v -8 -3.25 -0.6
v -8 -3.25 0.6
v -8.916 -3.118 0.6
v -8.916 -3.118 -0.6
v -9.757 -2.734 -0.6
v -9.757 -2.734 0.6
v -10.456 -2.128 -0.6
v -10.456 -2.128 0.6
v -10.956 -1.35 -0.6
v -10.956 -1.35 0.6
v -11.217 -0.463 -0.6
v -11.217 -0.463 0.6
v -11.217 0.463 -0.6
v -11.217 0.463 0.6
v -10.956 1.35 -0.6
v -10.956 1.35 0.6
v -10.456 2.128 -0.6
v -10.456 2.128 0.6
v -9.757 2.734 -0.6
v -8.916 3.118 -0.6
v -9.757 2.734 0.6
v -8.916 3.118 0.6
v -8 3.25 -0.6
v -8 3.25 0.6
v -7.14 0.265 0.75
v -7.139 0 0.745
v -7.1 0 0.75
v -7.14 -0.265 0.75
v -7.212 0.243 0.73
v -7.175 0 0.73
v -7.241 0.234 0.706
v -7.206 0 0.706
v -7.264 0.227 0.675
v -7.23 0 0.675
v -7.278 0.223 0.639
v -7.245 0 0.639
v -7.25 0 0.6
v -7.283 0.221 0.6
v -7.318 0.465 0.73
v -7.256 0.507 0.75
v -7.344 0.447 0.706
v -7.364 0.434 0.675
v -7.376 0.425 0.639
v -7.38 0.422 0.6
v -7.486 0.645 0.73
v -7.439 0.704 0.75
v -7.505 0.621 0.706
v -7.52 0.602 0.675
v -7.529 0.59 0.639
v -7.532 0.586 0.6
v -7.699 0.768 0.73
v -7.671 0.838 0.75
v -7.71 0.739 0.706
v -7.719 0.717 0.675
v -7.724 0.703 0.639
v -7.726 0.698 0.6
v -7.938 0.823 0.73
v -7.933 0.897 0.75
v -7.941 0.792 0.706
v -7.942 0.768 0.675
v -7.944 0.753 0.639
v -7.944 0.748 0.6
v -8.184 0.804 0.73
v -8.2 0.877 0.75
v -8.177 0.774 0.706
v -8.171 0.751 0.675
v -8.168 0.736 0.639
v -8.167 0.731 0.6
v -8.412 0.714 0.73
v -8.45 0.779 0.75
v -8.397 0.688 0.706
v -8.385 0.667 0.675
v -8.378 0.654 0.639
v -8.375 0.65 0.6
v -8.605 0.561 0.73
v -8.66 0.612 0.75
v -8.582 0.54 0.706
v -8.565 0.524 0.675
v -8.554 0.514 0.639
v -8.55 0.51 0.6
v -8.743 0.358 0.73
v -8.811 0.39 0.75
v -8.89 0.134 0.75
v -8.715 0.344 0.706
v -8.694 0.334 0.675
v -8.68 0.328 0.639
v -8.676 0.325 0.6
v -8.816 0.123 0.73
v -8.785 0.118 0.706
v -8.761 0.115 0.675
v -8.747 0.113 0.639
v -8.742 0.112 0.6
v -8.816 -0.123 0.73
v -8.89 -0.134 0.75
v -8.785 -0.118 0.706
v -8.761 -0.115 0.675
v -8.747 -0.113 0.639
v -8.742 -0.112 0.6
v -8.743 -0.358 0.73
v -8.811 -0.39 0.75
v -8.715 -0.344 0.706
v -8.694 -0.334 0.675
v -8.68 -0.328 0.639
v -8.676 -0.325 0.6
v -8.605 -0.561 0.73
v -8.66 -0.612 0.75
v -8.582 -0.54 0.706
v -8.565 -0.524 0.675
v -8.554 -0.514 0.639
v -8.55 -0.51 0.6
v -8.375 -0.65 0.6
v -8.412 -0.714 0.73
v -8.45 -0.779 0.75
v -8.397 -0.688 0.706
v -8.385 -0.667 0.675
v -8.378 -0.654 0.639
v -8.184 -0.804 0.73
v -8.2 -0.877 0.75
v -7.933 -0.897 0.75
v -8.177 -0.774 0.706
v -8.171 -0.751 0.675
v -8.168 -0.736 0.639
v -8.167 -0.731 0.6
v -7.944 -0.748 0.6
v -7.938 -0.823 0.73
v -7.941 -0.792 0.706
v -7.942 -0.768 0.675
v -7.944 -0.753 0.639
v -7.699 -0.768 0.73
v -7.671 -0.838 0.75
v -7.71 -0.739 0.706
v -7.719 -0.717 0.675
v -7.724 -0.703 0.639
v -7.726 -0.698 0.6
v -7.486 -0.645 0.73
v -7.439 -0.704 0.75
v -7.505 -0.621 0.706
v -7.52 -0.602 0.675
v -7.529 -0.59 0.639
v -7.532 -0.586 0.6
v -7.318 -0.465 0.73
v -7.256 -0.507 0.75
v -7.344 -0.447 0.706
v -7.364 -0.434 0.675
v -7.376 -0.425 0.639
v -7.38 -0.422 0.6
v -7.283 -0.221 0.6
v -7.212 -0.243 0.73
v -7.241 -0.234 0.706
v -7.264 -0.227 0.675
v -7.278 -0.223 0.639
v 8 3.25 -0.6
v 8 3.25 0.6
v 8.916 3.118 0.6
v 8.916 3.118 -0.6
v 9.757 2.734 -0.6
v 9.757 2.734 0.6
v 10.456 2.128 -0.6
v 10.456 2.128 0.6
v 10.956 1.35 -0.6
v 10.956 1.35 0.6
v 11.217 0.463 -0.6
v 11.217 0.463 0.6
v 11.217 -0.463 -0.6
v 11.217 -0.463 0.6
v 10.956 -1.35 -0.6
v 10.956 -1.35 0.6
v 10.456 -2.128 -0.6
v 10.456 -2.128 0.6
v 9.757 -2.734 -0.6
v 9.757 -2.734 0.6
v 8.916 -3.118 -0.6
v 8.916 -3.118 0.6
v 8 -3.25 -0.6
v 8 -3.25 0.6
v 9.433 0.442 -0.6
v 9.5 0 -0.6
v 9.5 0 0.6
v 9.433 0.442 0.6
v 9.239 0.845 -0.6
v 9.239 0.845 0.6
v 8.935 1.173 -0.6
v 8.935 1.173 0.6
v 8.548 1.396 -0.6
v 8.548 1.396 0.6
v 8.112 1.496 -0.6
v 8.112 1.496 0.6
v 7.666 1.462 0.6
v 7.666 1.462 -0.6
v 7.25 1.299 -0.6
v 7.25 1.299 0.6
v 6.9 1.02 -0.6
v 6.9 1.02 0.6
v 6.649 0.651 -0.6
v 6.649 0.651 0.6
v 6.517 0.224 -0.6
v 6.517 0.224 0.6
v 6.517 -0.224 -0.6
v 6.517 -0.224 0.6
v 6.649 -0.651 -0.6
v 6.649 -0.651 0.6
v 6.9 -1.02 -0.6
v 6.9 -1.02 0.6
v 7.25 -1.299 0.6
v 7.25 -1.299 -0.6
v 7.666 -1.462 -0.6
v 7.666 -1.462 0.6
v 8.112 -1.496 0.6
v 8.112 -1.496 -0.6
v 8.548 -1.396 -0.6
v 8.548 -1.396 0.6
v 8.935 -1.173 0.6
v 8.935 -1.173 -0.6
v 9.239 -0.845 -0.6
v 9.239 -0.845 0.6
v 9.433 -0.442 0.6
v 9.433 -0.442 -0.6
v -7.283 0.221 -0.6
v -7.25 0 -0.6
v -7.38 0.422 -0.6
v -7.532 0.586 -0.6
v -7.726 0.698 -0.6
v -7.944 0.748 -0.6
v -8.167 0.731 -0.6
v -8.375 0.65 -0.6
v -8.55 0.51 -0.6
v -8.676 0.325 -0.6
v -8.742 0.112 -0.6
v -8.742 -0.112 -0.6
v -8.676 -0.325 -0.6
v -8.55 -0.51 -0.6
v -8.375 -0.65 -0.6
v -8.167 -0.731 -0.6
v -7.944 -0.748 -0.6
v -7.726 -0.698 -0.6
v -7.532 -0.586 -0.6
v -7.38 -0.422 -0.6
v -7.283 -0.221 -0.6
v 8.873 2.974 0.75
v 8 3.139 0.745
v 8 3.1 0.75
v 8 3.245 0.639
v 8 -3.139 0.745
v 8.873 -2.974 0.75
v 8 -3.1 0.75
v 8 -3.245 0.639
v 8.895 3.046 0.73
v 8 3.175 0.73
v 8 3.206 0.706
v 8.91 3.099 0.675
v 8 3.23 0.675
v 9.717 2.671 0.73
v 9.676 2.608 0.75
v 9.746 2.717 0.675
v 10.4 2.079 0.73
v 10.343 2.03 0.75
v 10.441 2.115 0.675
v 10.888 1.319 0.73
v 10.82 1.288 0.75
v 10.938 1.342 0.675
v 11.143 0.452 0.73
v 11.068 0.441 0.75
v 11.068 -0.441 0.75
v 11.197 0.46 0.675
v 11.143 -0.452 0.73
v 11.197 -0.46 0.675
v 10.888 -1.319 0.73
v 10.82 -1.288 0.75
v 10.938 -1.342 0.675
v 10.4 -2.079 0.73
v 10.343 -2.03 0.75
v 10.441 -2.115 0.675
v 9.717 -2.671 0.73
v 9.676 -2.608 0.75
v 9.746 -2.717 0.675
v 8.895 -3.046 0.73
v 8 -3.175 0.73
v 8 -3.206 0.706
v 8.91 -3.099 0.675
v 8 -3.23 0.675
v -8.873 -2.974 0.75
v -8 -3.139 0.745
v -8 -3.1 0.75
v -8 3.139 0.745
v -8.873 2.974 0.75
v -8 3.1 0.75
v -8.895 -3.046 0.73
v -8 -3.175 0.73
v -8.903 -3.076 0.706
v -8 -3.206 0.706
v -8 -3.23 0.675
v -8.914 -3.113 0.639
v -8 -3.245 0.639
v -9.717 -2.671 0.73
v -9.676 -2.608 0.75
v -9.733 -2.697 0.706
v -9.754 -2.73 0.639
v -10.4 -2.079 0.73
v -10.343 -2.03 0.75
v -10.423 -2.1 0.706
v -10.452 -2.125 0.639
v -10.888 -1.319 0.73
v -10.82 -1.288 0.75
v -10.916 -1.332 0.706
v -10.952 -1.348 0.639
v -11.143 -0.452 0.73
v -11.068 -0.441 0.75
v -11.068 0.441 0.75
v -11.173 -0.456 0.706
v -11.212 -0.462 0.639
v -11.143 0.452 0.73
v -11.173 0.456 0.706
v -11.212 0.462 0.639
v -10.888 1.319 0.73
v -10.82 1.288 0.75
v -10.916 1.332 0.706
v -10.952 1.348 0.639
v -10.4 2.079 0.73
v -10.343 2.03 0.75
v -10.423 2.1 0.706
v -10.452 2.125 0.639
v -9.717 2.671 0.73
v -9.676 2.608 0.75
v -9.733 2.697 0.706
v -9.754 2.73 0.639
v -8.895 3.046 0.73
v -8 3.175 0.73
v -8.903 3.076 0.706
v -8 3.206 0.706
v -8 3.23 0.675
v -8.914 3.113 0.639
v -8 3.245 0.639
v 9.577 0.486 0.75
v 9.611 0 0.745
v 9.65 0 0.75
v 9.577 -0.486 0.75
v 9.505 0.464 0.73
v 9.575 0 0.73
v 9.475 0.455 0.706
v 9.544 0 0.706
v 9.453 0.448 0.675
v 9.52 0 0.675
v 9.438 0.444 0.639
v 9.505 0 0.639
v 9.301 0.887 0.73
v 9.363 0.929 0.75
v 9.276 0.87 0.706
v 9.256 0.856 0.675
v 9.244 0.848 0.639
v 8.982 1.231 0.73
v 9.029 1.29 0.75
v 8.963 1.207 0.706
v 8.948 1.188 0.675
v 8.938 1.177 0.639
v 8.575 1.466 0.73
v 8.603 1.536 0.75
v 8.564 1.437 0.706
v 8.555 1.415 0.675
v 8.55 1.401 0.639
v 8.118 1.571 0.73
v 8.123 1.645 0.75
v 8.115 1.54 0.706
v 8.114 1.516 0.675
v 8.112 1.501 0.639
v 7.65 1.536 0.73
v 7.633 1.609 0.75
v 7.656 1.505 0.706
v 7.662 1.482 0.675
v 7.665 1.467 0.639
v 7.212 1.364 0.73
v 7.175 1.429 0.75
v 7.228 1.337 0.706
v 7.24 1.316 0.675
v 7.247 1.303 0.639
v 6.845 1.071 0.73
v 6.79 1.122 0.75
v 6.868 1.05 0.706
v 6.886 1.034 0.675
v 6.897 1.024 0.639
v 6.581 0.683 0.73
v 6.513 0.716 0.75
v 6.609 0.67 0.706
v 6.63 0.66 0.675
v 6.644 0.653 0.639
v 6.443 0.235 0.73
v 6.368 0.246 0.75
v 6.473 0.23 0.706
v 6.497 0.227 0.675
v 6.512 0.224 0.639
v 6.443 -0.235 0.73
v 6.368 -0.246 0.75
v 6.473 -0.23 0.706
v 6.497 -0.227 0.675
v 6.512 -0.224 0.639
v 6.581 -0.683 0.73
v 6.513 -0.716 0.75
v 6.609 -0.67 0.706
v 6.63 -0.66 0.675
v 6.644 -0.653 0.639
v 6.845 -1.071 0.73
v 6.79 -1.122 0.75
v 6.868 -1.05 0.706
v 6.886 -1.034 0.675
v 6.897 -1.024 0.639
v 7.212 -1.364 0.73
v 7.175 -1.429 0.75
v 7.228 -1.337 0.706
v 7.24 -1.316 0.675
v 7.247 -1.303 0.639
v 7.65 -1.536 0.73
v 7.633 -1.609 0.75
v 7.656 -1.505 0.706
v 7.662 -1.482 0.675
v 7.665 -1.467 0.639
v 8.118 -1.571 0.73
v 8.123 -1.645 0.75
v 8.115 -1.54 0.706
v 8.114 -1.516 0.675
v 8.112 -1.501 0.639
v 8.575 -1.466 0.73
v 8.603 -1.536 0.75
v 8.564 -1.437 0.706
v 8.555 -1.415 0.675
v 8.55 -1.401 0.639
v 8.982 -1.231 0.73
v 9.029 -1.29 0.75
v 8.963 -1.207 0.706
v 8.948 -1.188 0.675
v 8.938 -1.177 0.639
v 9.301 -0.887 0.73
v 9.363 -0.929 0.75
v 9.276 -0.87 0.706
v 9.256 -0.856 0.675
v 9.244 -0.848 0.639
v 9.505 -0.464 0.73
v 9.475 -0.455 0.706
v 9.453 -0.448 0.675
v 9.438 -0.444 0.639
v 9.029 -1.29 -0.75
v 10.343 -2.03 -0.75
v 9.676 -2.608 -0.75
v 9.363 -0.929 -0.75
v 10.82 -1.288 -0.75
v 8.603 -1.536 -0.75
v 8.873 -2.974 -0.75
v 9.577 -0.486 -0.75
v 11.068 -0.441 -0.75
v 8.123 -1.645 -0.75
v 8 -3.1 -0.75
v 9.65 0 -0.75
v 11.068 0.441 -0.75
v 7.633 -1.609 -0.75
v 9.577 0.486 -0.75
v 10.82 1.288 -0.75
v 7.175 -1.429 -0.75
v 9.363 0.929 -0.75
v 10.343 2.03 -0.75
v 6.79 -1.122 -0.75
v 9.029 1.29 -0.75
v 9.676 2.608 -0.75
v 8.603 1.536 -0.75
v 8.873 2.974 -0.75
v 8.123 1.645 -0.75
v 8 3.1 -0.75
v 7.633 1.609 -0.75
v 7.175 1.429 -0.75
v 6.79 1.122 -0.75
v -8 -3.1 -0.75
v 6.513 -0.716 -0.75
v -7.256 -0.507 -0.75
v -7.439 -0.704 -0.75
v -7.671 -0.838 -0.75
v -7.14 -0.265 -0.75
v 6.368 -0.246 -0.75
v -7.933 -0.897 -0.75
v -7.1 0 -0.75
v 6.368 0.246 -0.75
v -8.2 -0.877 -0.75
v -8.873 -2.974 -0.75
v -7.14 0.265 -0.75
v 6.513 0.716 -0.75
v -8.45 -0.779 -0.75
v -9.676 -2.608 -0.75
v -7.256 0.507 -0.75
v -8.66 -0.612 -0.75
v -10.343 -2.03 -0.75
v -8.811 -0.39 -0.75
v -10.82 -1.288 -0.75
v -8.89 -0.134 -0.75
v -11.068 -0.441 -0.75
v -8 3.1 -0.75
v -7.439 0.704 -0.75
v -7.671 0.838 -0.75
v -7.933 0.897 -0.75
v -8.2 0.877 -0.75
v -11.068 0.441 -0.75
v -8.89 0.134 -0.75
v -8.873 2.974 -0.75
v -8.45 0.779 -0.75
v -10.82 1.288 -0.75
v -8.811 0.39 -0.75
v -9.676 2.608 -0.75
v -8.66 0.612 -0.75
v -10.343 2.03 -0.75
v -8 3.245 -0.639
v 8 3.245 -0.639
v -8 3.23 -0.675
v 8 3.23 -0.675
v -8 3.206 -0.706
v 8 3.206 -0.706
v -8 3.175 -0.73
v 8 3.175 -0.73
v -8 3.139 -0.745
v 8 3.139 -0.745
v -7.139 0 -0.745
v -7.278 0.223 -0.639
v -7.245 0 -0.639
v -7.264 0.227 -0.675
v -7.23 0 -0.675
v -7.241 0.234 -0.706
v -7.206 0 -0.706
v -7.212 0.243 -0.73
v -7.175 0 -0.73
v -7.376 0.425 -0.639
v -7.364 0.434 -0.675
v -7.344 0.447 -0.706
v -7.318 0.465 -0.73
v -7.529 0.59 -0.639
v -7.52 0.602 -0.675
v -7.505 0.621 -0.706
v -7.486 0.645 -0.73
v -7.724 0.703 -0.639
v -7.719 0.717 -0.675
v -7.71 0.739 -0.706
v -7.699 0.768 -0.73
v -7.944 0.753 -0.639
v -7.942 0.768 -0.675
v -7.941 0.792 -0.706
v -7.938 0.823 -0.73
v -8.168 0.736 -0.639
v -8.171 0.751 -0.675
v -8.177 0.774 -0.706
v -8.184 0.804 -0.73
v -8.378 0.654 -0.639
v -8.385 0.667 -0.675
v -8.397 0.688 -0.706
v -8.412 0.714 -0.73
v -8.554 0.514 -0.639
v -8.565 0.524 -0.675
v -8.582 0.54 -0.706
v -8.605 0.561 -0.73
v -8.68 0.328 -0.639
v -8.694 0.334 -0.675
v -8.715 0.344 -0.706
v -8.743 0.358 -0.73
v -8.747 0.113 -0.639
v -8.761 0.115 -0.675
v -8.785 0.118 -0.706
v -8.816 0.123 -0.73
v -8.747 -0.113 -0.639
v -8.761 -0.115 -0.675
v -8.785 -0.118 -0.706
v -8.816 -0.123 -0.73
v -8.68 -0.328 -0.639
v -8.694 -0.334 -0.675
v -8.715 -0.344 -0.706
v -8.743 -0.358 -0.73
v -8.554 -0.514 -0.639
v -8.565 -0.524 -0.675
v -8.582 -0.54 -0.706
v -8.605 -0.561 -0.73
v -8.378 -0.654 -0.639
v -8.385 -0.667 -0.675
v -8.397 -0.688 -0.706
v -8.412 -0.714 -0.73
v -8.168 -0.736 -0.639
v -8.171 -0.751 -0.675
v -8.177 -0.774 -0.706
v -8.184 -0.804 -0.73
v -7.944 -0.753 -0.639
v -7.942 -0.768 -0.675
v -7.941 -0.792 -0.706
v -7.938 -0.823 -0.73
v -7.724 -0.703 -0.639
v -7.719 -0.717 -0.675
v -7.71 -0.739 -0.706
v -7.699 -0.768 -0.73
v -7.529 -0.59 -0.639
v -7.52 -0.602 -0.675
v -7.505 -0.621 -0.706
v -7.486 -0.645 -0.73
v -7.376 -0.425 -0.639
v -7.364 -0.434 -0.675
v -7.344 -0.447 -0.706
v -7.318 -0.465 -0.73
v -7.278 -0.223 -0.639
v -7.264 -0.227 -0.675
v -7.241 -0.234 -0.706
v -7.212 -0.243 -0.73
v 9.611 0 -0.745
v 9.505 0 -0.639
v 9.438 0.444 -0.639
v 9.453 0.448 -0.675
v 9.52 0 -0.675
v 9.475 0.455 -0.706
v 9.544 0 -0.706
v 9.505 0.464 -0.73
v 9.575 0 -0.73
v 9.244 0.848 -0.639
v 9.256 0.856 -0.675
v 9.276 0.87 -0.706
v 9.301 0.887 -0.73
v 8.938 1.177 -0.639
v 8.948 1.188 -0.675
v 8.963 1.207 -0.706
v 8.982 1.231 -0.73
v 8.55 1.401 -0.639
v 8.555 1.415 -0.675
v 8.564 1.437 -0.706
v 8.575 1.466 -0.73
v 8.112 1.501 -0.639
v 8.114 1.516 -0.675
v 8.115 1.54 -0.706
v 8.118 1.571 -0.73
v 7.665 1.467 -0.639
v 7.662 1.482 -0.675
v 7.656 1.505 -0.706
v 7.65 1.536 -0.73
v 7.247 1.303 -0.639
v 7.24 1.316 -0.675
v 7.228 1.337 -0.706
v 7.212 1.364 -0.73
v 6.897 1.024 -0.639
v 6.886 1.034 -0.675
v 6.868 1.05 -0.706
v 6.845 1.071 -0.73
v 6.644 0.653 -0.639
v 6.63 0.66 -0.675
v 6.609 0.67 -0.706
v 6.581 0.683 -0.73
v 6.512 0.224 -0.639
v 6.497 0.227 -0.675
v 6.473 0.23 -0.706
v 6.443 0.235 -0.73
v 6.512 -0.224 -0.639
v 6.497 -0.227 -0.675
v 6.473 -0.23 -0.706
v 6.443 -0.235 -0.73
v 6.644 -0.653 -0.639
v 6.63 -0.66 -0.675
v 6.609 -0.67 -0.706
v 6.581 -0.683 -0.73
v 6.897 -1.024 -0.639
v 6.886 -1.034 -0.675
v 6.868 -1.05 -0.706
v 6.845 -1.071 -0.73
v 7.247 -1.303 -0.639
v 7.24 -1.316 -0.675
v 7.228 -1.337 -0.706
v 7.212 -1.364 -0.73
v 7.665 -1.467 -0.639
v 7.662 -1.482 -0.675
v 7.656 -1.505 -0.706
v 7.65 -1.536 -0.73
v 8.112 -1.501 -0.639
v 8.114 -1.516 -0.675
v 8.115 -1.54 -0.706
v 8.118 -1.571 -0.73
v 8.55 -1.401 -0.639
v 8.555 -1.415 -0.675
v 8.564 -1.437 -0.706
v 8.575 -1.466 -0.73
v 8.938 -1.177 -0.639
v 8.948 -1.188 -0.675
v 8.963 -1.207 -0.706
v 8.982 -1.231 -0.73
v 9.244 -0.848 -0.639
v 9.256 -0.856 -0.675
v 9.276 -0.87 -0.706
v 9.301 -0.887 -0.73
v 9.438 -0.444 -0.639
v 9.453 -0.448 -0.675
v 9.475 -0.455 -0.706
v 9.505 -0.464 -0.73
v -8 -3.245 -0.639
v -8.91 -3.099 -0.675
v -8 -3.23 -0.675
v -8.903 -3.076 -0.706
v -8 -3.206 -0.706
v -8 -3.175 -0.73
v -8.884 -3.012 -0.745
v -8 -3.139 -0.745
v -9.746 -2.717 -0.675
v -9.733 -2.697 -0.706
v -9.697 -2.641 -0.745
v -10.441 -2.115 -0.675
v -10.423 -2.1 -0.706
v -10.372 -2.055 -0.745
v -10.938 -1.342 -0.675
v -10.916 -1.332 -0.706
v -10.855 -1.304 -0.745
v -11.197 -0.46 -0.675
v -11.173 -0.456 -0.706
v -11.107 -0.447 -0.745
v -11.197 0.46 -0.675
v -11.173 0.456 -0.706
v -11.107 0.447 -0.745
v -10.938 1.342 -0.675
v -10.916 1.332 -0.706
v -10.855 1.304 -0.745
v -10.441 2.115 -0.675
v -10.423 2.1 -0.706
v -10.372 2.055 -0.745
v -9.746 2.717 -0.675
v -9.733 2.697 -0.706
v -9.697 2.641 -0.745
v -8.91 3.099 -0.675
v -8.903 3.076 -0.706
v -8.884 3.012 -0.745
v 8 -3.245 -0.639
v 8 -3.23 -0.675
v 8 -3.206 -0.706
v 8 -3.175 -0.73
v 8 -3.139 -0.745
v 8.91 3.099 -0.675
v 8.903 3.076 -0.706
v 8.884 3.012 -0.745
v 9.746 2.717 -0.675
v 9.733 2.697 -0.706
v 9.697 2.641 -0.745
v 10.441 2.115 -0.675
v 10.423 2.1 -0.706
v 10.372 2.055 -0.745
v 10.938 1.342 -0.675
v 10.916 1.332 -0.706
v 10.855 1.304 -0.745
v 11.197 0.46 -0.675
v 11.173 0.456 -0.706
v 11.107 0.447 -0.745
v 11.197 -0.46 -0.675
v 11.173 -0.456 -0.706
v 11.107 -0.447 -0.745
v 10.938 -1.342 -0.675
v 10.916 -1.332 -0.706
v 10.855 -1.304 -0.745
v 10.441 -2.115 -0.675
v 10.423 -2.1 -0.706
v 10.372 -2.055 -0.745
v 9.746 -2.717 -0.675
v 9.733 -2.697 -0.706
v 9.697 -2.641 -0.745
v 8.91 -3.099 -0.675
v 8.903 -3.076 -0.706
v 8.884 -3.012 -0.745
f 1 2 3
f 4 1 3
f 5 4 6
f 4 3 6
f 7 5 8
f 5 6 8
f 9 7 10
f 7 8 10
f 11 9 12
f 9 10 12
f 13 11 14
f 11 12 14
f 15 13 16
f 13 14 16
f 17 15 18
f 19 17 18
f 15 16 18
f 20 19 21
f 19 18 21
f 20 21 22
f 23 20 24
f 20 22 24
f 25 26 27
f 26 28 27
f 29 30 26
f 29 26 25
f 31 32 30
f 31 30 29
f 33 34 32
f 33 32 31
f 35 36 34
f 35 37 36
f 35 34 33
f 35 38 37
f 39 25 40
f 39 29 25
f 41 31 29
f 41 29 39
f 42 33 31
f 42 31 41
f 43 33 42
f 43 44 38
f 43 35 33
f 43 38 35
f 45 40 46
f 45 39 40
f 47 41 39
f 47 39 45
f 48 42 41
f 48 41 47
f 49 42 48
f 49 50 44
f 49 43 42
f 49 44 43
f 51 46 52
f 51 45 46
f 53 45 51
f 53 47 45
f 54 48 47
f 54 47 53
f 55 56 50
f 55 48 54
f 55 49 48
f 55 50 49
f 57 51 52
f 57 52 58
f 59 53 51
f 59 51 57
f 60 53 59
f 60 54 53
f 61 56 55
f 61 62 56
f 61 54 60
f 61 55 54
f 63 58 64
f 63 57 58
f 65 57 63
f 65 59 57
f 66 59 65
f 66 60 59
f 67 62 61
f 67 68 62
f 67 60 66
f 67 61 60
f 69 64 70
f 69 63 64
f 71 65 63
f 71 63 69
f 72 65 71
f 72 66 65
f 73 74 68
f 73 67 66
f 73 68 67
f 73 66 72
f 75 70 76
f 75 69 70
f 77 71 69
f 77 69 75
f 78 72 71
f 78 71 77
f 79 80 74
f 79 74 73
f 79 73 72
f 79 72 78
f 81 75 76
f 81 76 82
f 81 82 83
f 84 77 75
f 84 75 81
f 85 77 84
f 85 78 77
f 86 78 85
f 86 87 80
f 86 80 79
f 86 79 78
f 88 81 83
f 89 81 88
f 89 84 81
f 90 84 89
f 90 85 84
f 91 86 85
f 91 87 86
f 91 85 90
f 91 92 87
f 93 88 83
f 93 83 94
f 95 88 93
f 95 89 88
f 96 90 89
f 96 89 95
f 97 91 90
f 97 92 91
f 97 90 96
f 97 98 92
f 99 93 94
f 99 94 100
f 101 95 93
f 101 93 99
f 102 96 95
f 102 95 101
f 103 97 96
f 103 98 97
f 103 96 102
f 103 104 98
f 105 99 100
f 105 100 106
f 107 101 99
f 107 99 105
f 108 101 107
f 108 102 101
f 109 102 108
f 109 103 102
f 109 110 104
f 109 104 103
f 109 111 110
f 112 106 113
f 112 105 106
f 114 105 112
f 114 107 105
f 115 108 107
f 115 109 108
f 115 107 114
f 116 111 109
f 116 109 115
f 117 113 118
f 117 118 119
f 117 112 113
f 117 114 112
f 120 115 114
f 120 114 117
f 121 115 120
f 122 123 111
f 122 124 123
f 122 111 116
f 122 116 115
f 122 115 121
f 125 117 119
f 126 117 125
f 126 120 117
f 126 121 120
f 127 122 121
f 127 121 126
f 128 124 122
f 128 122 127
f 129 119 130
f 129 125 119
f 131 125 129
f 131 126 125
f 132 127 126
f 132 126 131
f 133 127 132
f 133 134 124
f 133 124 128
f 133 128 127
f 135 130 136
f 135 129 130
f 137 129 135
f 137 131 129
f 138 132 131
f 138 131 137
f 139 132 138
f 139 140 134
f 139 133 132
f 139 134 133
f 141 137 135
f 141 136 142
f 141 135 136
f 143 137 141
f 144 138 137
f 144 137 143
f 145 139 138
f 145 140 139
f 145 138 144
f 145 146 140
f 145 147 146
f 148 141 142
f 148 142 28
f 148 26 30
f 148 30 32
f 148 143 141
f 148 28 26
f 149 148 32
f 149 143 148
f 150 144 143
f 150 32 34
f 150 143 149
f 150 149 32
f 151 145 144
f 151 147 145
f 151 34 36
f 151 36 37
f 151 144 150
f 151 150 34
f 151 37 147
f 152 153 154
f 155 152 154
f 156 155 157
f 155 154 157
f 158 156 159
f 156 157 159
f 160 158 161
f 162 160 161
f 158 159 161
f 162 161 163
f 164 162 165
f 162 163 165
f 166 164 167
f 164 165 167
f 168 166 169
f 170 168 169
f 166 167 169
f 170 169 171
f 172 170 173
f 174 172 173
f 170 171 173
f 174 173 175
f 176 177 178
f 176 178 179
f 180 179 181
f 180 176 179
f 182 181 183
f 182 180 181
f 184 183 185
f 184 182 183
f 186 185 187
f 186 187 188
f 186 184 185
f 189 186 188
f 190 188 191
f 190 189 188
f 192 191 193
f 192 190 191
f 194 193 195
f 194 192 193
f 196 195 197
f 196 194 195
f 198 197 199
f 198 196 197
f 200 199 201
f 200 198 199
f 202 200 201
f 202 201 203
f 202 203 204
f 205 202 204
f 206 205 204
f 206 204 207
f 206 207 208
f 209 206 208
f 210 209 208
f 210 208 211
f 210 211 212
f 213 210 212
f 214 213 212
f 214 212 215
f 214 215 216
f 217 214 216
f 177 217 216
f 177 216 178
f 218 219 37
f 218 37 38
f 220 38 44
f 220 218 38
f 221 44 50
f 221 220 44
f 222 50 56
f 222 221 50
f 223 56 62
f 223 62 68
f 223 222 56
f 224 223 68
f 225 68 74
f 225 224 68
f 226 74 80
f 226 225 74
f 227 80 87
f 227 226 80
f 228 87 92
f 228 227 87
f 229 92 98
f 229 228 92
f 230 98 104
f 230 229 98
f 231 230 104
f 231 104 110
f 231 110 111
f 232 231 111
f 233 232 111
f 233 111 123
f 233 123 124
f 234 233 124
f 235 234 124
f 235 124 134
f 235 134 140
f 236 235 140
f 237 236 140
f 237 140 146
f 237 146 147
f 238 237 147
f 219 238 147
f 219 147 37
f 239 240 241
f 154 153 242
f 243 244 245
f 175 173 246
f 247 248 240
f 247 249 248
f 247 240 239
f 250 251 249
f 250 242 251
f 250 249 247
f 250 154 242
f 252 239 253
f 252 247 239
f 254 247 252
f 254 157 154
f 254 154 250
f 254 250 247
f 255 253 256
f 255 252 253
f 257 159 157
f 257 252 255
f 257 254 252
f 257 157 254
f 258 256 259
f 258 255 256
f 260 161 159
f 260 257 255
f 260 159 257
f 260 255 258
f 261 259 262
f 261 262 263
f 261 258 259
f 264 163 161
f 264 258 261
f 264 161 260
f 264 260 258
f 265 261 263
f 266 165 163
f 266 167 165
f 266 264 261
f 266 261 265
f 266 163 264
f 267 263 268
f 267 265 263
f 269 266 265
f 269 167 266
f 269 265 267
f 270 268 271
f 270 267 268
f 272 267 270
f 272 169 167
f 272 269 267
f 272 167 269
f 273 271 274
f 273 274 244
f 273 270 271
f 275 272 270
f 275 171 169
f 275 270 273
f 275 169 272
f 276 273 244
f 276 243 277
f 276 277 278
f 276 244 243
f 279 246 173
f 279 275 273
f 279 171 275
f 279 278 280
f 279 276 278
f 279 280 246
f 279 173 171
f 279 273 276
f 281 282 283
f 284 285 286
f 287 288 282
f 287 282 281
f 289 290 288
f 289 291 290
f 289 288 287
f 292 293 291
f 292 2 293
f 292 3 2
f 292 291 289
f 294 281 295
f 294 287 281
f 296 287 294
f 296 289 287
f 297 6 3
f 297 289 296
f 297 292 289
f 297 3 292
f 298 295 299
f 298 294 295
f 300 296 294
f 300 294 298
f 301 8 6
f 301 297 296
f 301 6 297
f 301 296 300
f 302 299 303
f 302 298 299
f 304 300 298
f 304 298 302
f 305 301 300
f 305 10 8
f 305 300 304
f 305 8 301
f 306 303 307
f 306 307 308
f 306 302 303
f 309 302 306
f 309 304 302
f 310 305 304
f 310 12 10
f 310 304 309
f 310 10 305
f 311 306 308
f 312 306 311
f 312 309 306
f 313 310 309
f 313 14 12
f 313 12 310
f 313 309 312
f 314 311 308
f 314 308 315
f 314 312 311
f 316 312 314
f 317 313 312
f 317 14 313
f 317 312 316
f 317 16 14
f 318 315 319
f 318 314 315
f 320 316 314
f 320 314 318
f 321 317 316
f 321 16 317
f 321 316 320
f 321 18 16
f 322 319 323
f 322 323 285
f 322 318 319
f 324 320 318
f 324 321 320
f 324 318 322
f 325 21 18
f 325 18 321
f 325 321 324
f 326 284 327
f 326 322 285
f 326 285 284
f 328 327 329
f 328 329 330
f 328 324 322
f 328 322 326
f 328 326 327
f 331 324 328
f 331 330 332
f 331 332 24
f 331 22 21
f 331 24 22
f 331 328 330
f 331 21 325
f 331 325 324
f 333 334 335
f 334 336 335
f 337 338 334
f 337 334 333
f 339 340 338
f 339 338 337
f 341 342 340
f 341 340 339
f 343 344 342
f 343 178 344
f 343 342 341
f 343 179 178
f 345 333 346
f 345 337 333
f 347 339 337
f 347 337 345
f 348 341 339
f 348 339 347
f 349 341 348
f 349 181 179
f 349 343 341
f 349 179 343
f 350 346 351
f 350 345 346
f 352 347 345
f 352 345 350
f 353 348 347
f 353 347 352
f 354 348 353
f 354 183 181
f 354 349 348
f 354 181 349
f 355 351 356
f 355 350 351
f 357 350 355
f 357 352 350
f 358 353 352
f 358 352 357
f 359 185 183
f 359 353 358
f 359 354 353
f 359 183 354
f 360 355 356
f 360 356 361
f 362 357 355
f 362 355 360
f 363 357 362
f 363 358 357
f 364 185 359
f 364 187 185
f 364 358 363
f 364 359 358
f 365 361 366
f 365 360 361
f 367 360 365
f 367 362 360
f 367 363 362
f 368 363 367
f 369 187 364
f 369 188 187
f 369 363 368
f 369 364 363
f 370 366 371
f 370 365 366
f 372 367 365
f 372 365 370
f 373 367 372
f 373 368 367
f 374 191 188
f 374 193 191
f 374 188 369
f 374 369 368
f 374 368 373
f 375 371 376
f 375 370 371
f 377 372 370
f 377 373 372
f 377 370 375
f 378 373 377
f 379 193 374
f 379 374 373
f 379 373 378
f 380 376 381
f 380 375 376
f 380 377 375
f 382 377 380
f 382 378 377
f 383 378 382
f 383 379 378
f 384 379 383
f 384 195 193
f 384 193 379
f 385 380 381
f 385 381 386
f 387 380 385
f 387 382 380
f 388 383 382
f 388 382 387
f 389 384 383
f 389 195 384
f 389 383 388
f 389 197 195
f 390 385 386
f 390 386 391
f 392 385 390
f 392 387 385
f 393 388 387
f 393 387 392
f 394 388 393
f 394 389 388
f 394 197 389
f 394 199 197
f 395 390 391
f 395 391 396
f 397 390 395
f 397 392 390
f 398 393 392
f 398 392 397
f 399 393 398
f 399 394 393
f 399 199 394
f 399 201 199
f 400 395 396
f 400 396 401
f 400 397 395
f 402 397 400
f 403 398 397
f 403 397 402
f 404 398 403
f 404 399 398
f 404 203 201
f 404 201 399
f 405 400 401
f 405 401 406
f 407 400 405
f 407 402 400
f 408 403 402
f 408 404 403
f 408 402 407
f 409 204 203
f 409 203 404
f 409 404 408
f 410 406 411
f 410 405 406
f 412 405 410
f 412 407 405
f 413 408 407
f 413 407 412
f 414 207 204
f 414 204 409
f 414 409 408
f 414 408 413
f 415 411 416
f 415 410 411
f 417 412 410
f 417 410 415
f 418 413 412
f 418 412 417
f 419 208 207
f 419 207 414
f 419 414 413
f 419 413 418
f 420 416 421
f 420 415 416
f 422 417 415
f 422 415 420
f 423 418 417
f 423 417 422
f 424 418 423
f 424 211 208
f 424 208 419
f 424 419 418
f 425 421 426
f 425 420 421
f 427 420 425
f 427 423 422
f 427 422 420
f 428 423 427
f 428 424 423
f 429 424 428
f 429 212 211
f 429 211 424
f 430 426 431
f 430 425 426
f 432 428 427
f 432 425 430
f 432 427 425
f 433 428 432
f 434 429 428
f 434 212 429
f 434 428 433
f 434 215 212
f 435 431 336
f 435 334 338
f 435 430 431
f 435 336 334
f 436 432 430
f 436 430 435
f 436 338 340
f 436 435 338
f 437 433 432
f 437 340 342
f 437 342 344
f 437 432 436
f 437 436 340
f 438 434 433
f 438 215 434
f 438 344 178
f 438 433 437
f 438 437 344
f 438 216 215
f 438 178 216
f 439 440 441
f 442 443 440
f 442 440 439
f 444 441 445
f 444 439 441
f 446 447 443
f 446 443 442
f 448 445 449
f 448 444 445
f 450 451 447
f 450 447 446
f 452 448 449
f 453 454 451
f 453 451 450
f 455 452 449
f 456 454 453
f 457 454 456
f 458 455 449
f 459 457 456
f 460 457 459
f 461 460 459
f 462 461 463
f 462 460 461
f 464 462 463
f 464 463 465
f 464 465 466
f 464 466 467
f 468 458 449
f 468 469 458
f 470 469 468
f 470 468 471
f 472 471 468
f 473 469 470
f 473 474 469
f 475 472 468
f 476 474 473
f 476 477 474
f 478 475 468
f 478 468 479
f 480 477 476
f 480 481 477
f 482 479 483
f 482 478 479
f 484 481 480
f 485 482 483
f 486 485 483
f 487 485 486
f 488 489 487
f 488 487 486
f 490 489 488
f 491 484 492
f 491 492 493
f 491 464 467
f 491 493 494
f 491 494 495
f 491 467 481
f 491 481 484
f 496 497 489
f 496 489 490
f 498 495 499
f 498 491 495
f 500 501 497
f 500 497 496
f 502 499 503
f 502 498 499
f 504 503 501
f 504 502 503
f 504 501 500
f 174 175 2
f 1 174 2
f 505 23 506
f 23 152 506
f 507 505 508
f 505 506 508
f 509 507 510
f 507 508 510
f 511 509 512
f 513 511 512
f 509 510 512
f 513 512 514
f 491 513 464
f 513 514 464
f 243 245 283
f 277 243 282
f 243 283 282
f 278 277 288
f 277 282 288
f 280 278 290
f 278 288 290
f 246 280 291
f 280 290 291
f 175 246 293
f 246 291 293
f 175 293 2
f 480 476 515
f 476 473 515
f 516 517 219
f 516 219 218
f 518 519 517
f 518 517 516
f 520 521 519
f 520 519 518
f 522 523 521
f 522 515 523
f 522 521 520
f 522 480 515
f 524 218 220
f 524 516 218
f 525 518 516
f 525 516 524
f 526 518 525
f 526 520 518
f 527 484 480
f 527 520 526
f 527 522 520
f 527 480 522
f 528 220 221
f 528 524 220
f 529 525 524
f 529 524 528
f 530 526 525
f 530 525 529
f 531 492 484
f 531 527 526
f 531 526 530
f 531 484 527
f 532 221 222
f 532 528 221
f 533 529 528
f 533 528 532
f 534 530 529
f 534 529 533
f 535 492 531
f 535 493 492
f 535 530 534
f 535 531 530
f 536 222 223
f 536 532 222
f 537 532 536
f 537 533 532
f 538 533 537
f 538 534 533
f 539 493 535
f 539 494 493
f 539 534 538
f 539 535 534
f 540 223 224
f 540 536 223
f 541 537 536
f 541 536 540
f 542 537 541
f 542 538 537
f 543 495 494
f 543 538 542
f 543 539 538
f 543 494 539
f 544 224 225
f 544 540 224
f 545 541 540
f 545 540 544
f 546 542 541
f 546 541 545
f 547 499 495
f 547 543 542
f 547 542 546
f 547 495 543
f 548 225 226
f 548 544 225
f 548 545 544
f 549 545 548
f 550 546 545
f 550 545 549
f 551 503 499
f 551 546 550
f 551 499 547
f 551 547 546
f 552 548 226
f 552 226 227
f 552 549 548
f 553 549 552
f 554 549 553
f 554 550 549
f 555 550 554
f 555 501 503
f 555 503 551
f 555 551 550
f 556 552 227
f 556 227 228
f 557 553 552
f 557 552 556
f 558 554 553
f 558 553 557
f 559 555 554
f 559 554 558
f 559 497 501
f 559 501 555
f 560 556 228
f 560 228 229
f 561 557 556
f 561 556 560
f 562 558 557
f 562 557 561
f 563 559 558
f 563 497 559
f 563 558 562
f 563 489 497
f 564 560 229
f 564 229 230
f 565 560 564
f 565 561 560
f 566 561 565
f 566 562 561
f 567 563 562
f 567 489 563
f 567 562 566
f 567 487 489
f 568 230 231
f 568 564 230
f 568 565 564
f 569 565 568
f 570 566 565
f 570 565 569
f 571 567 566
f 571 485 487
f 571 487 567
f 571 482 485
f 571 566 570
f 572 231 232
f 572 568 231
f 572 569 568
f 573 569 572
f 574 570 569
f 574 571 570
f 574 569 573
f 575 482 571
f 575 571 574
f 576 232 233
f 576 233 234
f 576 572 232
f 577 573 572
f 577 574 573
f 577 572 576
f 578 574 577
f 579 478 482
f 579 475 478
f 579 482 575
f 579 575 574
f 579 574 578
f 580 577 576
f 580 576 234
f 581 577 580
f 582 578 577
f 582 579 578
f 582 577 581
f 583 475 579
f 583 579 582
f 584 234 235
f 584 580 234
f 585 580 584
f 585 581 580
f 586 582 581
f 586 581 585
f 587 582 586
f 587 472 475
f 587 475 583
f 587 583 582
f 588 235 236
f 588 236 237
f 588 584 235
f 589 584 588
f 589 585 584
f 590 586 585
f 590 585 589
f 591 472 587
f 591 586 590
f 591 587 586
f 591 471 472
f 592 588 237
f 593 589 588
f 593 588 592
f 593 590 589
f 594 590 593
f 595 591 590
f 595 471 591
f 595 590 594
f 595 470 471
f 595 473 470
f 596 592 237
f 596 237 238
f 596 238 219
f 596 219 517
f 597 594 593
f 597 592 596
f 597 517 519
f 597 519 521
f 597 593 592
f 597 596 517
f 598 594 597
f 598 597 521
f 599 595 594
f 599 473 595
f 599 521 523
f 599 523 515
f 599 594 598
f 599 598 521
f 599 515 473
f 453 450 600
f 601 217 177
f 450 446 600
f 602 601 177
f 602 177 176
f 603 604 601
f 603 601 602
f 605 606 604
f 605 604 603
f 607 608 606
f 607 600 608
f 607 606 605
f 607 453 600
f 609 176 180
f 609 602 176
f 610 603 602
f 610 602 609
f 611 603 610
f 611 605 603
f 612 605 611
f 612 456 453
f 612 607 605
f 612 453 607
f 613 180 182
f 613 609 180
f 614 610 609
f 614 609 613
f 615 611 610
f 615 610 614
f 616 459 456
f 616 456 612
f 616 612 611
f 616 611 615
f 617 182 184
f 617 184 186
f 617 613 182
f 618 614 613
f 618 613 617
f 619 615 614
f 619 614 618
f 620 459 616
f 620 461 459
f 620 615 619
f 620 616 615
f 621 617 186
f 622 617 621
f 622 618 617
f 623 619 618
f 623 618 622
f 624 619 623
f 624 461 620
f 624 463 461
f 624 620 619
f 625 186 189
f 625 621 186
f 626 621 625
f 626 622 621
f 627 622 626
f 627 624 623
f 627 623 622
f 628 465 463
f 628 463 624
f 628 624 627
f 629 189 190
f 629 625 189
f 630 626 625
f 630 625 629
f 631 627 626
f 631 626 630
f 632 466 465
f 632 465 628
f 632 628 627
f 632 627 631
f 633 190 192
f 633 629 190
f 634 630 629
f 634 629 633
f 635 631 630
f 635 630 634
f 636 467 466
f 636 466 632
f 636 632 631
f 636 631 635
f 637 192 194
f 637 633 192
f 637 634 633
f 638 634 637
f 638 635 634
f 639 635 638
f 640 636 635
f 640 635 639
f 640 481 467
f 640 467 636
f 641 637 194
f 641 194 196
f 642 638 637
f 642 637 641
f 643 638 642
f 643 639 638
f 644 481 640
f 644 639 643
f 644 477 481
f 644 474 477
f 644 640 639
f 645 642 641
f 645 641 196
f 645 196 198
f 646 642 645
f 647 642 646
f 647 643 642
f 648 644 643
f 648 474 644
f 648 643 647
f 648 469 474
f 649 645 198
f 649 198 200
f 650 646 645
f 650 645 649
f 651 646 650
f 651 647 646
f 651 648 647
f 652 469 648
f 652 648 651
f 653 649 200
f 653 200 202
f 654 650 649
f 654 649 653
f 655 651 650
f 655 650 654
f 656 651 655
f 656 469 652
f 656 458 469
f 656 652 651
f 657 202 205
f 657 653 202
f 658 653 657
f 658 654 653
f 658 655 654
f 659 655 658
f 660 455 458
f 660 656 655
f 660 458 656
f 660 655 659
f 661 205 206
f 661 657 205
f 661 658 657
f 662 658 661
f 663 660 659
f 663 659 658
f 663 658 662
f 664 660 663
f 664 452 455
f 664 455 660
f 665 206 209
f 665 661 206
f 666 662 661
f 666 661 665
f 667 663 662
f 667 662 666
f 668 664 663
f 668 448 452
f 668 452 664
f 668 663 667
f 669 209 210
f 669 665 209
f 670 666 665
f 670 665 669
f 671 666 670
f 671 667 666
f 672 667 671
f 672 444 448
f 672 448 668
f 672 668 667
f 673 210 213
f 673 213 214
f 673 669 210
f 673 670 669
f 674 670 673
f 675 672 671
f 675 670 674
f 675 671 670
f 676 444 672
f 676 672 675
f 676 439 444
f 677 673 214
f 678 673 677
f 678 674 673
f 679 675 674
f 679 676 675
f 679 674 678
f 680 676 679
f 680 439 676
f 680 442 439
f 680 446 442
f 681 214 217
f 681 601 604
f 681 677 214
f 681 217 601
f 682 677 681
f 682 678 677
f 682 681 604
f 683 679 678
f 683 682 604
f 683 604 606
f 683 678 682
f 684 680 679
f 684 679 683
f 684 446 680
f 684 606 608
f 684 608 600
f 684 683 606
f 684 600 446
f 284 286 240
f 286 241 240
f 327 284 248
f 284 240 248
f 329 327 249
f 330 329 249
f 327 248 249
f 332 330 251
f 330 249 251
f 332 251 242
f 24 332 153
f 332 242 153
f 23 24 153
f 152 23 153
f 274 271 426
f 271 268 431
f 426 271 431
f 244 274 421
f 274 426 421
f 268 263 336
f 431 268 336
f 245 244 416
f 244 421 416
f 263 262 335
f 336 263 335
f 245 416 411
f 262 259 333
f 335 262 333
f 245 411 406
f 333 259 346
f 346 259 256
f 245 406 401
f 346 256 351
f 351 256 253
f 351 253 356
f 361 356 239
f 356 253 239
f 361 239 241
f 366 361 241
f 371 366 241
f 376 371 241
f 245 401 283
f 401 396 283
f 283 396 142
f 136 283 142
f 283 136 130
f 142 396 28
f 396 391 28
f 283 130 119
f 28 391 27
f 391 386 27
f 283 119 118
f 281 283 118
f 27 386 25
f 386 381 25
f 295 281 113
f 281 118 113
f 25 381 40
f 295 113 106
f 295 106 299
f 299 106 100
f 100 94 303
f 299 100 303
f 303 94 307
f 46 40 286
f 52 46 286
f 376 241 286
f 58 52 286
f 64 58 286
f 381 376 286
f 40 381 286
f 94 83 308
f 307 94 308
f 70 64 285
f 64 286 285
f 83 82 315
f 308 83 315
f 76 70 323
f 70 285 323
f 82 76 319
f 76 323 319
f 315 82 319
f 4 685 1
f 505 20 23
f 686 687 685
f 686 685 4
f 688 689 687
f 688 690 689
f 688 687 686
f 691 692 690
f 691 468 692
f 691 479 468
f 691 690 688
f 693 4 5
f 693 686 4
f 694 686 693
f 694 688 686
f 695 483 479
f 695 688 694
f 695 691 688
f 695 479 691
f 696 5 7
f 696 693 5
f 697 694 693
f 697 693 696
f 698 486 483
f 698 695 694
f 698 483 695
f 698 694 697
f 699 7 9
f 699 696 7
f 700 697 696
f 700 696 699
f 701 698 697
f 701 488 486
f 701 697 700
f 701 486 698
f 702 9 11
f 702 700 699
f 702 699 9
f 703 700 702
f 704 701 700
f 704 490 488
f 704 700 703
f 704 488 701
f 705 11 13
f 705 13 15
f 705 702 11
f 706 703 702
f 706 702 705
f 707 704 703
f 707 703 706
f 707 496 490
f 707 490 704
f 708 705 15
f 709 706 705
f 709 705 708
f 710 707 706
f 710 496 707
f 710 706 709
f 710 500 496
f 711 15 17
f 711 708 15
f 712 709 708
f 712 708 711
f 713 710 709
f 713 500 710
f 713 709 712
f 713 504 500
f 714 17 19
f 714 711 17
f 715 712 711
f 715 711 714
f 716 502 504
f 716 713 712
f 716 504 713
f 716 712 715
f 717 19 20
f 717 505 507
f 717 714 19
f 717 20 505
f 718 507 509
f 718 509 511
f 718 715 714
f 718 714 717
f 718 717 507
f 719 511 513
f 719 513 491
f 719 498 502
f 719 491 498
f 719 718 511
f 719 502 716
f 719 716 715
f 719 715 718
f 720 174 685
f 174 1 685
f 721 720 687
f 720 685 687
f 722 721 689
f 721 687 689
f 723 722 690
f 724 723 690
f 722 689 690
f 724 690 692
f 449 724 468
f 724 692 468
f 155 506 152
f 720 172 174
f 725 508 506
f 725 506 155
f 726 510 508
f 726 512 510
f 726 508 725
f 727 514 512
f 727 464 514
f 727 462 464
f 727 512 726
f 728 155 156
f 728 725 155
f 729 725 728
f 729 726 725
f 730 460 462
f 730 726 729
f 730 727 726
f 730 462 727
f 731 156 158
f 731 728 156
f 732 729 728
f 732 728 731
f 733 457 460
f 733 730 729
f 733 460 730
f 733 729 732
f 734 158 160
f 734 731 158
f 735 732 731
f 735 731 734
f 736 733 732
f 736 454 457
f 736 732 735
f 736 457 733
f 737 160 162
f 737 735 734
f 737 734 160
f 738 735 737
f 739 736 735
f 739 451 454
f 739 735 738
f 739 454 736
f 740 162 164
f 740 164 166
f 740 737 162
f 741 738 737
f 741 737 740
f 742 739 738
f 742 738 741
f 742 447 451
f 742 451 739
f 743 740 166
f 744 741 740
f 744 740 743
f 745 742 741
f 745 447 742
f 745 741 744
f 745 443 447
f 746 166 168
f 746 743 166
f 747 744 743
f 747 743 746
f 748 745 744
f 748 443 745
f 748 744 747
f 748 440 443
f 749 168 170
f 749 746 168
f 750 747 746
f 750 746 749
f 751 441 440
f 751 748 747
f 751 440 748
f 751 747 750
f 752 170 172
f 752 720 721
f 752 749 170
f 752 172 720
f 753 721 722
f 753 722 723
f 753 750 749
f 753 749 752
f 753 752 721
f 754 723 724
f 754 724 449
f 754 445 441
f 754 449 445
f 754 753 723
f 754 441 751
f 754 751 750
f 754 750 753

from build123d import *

# Parameters (mm, degrees)
SKETCH1_R           = 0.75
SKETCH1_R_2         = 1.5
BOSS_EXTRUDE1_DEPTH = 0.75
FILLET1_R           = 0.15


with BuildPart() as part:
    # Sketch1 → Boss-Extrude1 (new, symmetric)
    with BuildSketch(Plane.XY):
        with BuildLine():
            Line((-8, 3.25), (8, 3.25))
            ThreePointArc((8, 3.25), (11.25, 0), (8, -3.25))
            Line((8, -3.25), (-8, -3.25))
            ThreePointArc((-8, -3.25), (-11.25, 0), (-8, 3.25))
        make_face()
        with Locations((-8, 0)):
            Circle(SKETCH1_R, mode=Mode.SUBTRACT)
        with Locations((8, 0)):
            Circle(SKETCH1_R_2, mode=Mode.SUBTRACT)
    extrude(amount=BOSS_EXTRUDE1_DEPTH, both=True)

    # Fillet1
    fillet1_edges = [part.edges().sort_by_distance(p)[0] for p in [
        (-8.75, 0, -0.75),
        (-8.75, 0, 0.75),
        (11.25, 0, 0.75),
        (6.5, 0, -0.75),
        (6.5, 0, 0.75),
        (0, 3.25, 0.75),
        (-11.25, 0, 0.75),
        (0, 3.25, -0.75),
        (11.25, 0, -0.75),
        (0, -3.25, -0.75),
        (-11.25, 0, -0.75),
        (0, -3.25, 0.75),
    ]]
    fillet(fillet1_edges, radius=FILLET1_R)


solid = part.part
